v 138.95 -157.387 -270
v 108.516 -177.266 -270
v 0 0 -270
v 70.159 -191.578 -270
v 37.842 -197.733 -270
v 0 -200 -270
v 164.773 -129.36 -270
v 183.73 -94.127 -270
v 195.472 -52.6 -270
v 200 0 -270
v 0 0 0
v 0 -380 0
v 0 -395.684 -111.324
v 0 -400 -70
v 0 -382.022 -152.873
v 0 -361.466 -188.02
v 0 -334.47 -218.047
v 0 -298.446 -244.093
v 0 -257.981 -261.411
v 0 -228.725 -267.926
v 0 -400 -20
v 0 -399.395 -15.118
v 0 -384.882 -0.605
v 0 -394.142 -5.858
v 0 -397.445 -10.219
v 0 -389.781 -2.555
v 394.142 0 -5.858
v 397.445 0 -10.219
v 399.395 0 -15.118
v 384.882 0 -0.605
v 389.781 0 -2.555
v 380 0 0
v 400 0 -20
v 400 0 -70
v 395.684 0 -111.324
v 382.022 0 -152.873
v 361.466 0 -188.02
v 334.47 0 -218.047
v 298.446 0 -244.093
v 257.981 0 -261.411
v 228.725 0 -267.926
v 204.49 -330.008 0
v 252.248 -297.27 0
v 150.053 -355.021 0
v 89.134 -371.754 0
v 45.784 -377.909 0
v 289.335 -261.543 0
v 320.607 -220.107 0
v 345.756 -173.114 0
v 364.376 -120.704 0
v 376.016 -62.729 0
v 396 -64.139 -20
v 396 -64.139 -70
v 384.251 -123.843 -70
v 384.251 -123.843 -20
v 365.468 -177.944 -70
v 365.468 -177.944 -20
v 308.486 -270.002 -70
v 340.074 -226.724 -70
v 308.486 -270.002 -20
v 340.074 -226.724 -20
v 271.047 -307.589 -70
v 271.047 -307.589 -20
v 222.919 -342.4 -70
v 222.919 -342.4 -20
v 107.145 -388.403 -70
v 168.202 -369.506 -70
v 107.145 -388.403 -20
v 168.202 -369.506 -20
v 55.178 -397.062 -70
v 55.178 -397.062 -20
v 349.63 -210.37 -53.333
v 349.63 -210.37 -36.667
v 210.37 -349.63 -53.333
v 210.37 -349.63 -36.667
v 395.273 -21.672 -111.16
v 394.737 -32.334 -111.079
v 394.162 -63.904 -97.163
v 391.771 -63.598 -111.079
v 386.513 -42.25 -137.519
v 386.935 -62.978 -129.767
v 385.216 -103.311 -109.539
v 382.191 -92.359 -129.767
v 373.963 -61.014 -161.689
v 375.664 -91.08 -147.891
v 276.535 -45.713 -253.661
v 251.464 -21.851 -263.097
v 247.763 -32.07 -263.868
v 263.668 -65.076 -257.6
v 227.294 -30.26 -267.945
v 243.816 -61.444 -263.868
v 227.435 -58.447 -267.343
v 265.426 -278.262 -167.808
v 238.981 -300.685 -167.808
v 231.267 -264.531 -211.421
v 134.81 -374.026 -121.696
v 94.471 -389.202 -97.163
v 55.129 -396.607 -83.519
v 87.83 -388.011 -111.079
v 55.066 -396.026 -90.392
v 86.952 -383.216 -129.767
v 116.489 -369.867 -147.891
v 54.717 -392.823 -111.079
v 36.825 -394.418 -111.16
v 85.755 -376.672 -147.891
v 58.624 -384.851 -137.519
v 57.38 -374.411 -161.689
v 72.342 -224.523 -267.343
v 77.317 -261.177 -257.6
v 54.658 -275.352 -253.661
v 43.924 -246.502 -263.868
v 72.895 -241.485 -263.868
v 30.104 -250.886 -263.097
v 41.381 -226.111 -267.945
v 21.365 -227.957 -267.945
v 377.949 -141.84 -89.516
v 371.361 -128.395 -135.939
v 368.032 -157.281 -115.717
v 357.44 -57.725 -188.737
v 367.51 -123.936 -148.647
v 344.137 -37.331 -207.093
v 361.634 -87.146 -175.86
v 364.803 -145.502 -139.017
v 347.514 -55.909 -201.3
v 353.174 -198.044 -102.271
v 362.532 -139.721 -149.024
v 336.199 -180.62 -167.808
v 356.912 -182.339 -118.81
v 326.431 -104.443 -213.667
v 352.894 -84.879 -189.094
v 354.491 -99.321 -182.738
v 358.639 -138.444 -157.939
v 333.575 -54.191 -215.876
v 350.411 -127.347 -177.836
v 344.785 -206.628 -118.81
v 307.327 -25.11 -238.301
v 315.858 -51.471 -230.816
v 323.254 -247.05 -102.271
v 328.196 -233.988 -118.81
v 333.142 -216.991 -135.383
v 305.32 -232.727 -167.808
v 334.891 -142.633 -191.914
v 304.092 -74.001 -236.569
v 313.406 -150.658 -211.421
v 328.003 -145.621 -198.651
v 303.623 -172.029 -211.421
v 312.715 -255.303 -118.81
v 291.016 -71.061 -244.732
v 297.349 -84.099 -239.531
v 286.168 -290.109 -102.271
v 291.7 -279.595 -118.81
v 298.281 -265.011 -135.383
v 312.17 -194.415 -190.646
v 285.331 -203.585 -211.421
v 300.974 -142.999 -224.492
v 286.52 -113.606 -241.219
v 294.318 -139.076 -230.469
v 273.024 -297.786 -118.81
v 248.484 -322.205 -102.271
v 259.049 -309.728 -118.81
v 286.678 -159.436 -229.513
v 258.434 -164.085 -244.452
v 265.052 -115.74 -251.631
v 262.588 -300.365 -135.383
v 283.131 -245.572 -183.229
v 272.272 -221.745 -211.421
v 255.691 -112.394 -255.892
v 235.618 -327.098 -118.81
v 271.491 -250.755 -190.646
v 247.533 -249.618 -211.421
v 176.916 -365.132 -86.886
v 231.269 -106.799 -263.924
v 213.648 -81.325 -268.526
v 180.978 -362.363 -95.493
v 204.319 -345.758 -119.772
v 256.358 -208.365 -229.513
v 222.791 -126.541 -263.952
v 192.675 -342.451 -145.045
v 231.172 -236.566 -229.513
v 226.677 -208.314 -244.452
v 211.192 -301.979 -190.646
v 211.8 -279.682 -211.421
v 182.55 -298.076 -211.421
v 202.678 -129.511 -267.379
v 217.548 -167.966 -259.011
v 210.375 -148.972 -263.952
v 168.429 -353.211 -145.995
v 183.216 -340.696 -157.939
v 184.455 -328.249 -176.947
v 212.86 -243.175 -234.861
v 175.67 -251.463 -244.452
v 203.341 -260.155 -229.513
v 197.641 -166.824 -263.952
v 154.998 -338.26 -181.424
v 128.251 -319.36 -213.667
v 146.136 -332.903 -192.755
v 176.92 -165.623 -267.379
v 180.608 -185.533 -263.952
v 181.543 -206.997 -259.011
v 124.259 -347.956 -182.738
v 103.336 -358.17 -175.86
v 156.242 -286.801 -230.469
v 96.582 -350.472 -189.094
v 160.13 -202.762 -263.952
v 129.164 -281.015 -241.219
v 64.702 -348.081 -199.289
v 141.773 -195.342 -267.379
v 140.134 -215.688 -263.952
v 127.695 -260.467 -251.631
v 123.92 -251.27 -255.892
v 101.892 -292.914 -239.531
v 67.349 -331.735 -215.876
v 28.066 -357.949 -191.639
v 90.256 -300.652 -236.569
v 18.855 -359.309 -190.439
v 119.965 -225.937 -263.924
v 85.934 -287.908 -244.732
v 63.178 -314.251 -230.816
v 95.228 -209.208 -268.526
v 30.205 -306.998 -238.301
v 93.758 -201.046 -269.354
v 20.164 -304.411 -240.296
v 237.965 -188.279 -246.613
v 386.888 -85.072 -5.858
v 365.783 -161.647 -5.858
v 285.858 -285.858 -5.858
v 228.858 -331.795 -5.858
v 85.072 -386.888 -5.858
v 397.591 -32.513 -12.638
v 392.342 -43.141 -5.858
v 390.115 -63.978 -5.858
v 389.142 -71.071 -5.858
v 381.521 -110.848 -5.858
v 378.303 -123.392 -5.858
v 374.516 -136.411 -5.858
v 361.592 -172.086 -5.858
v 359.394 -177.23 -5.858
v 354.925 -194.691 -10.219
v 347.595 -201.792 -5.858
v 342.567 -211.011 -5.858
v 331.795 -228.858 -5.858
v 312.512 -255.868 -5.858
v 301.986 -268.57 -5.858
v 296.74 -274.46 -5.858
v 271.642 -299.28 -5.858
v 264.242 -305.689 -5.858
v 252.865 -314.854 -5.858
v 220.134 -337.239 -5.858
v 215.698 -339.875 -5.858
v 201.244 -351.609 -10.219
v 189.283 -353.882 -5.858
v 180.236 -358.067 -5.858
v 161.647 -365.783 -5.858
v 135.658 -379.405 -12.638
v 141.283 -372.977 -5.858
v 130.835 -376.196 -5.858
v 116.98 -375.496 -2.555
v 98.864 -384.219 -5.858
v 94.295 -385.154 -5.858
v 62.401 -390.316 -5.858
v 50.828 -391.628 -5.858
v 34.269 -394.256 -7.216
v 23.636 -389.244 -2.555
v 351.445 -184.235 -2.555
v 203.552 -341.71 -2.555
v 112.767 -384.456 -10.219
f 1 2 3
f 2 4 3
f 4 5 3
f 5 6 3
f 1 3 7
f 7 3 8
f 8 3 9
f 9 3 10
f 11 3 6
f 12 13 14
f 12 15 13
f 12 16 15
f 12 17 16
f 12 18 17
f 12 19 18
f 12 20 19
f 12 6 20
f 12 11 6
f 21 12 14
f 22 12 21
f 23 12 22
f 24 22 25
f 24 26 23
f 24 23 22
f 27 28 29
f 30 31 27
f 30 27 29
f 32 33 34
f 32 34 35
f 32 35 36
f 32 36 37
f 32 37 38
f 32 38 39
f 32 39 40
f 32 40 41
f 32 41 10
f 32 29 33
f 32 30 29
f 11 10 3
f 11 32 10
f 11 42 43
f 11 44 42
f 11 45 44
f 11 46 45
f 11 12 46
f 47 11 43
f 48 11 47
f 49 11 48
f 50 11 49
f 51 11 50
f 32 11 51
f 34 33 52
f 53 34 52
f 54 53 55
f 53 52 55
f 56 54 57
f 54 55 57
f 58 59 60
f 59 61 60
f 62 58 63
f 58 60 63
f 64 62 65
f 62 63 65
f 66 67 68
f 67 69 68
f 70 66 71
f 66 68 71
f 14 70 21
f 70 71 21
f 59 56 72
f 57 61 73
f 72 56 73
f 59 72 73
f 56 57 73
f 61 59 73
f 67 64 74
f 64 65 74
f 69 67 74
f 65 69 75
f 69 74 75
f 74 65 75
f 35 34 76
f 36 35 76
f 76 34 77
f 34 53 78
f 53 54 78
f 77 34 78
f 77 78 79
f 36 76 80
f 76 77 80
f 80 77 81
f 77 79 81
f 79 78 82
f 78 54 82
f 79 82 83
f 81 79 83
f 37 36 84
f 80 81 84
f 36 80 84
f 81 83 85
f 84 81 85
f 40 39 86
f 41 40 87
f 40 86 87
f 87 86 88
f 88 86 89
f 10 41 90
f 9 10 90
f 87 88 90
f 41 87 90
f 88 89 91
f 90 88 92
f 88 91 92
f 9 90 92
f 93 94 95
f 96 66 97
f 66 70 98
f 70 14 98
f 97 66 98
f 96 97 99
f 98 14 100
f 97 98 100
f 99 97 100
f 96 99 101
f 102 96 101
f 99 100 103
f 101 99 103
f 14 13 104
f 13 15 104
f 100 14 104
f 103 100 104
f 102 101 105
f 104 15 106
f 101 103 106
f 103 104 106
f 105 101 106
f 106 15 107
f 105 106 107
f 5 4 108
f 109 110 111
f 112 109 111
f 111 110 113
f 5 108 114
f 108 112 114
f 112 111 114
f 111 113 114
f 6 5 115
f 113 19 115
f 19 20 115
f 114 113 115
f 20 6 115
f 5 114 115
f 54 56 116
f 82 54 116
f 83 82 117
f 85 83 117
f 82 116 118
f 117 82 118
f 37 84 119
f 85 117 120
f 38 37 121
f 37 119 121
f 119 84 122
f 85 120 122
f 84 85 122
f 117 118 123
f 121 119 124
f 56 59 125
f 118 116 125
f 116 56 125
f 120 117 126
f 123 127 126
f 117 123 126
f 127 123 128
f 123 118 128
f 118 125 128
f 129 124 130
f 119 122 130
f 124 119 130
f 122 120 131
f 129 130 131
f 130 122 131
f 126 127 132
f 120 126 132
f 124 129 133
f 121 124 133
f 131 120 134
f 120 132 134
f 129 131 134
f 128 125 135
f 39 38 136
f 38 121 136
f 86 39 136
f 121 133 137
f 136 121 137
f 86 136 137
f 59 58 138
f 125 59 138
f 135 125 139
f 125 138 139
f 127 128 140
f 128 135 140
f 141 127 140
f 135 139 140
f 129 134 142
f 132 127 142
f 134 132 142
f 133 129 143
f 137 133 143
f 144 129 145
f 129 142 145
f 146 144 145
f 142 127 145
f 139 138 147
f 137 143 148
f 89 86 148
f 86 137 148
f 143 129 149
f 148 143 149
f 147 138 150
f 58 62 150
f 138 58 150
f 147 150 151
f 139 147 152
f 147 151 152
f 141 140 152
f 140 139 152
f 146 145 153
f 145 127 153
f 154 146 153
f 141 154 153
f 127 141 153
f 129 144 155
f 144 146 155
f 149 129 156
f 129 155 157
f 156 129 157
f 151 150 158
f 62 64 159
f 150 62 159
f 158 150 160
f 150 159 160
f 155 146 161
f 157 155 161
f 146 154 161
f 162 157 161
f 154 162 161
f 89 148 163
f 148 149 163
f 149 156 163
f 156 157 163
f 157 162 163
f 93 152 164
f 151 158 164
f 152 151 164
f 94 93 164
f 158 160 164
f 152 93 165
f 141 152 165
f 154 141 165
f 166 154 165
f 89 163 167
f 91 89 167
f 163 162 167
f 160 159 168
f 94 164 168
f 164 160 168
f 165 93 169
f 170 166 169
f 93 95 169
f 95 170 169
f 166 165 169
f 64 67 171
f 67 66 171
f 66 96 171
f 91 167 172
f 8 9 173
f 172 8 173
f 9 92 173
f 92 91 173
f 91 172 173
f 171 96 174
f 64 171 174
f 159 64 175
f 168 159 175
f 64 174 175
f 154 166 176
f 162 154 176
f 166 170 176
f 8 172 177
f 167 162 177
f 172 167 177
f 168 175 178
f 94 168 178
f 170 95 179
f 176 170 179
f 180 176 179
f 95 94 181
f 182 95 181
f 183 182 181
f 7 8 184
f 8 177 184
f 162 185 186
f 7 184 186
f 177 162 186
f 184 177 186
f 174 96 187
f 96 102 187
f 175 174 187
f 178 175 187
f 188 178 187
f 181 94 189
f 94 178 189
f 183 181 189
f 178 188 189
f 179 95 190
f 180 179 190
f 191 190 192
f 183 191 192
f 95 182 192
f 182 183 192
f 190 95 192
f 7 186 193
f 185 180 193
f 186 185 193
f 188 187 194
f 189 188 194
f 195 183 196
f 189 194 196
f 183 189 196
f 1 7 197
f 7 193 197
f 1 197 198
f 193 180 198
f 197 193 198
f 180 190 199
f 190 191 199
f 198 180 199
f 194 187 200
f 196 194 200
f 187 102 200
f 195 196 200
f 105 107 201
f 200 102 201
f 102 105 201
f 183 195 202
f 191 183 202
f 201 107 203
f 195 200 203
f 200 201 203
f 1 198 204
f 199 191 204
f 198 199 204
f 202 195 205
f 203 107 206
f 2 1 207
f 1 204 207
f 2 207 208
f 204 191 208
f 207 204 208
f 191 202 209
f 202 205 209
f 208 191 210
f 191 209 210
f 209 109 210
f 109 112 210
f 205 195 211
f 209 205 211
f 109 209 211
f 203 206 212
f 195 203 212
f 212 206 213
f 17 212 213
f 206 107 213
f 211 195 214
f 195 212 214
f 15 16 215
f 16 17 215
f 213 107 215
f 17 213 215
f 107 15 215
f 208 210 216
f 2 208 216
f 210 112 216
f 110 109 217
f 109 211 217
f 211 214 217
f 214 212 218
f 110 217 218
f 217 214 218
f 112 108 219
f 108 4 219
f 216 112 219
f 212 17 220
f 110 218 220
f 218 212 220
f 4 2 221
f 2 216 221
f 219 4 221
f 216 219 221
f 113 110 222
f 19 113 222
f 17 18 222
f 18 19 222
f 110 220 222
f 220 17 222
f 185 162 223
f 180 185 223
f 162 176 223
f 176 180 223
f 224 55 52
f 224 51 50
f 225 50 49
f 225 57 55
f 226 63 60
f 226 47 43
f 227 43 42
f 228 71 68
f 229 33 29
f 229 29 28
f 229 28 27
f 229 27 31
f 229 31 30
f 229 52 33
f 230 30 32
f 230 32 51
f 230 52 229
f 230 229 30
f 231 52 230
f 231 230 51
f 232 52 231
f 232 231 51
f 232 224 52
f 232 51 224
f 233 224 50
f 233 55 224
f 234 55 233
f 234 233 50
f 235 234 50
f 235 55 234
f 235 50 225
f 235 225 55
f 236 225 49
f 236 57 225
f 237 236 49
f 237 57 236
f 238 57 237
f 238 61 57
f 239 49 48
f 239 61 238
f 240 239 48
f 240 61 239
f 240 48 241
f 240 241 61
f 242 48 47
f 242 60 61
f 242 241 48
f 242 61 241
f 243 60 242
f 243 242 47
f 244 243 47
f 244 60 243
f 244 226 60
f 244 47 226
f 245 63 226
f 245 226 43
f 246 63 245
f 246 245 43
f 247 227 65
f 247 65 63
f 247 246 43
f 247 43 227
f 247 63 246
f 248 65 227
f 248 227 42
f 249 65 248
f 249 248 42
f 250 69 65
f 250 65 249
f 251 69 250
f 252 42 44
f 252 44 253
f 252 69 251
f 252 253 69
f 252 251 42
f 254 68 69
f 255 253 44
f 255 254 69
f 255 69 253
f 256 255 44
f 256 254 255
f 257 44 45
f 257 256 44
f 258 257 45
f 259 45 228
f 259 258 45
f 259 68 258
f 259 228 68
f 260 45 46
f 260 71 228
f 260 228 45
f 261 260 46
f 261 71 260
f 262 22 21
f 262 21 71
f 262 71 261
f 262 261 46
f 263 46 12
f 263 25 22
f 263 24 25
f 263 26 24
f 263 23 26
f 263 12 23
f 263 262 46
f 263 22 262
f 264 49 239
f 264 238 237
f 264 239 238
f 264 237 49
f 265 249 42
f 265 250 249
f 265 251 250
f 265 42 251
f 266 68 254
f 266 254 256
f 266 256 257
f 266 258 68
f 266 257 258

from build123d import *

# Parameters (mm, degrees)
F1_DEPTH = 270
F2_R     = 200
F3_R     = 20


with BuildPart() as f1:
    # F0 (on Top) → F1 (new body)
    with BuildSketch(Plane.XY):
        with BuildLine():
            Line((400, 0), (0, 0))
            Line((0, 0), (0, -400))
            add(Edge.make_bspline(
                [(400, 0), (400, -240), (240, -400), (0, -400)],
                knots=[0, 0, 0, 0, 565.685425, 565.685425, 565.685425, 565.685425], degree=3))
        make_face()
    extrude(amount=-F1_DEPTH)

    # F2
    f2_edges = [f1.edges().sort_by_distance(p)[0] for p in [
        (290, -290, -270),
    ]]
    fillet(f2_edges, radius=F2_R)

    # F3
    f3_edges = [f1.edges().sort_by_distance(p)[0] for p in [
        (290, -290, 0),
    ]]
    fillet(f3_edges, radius=F3_R)


solid = f1.part
